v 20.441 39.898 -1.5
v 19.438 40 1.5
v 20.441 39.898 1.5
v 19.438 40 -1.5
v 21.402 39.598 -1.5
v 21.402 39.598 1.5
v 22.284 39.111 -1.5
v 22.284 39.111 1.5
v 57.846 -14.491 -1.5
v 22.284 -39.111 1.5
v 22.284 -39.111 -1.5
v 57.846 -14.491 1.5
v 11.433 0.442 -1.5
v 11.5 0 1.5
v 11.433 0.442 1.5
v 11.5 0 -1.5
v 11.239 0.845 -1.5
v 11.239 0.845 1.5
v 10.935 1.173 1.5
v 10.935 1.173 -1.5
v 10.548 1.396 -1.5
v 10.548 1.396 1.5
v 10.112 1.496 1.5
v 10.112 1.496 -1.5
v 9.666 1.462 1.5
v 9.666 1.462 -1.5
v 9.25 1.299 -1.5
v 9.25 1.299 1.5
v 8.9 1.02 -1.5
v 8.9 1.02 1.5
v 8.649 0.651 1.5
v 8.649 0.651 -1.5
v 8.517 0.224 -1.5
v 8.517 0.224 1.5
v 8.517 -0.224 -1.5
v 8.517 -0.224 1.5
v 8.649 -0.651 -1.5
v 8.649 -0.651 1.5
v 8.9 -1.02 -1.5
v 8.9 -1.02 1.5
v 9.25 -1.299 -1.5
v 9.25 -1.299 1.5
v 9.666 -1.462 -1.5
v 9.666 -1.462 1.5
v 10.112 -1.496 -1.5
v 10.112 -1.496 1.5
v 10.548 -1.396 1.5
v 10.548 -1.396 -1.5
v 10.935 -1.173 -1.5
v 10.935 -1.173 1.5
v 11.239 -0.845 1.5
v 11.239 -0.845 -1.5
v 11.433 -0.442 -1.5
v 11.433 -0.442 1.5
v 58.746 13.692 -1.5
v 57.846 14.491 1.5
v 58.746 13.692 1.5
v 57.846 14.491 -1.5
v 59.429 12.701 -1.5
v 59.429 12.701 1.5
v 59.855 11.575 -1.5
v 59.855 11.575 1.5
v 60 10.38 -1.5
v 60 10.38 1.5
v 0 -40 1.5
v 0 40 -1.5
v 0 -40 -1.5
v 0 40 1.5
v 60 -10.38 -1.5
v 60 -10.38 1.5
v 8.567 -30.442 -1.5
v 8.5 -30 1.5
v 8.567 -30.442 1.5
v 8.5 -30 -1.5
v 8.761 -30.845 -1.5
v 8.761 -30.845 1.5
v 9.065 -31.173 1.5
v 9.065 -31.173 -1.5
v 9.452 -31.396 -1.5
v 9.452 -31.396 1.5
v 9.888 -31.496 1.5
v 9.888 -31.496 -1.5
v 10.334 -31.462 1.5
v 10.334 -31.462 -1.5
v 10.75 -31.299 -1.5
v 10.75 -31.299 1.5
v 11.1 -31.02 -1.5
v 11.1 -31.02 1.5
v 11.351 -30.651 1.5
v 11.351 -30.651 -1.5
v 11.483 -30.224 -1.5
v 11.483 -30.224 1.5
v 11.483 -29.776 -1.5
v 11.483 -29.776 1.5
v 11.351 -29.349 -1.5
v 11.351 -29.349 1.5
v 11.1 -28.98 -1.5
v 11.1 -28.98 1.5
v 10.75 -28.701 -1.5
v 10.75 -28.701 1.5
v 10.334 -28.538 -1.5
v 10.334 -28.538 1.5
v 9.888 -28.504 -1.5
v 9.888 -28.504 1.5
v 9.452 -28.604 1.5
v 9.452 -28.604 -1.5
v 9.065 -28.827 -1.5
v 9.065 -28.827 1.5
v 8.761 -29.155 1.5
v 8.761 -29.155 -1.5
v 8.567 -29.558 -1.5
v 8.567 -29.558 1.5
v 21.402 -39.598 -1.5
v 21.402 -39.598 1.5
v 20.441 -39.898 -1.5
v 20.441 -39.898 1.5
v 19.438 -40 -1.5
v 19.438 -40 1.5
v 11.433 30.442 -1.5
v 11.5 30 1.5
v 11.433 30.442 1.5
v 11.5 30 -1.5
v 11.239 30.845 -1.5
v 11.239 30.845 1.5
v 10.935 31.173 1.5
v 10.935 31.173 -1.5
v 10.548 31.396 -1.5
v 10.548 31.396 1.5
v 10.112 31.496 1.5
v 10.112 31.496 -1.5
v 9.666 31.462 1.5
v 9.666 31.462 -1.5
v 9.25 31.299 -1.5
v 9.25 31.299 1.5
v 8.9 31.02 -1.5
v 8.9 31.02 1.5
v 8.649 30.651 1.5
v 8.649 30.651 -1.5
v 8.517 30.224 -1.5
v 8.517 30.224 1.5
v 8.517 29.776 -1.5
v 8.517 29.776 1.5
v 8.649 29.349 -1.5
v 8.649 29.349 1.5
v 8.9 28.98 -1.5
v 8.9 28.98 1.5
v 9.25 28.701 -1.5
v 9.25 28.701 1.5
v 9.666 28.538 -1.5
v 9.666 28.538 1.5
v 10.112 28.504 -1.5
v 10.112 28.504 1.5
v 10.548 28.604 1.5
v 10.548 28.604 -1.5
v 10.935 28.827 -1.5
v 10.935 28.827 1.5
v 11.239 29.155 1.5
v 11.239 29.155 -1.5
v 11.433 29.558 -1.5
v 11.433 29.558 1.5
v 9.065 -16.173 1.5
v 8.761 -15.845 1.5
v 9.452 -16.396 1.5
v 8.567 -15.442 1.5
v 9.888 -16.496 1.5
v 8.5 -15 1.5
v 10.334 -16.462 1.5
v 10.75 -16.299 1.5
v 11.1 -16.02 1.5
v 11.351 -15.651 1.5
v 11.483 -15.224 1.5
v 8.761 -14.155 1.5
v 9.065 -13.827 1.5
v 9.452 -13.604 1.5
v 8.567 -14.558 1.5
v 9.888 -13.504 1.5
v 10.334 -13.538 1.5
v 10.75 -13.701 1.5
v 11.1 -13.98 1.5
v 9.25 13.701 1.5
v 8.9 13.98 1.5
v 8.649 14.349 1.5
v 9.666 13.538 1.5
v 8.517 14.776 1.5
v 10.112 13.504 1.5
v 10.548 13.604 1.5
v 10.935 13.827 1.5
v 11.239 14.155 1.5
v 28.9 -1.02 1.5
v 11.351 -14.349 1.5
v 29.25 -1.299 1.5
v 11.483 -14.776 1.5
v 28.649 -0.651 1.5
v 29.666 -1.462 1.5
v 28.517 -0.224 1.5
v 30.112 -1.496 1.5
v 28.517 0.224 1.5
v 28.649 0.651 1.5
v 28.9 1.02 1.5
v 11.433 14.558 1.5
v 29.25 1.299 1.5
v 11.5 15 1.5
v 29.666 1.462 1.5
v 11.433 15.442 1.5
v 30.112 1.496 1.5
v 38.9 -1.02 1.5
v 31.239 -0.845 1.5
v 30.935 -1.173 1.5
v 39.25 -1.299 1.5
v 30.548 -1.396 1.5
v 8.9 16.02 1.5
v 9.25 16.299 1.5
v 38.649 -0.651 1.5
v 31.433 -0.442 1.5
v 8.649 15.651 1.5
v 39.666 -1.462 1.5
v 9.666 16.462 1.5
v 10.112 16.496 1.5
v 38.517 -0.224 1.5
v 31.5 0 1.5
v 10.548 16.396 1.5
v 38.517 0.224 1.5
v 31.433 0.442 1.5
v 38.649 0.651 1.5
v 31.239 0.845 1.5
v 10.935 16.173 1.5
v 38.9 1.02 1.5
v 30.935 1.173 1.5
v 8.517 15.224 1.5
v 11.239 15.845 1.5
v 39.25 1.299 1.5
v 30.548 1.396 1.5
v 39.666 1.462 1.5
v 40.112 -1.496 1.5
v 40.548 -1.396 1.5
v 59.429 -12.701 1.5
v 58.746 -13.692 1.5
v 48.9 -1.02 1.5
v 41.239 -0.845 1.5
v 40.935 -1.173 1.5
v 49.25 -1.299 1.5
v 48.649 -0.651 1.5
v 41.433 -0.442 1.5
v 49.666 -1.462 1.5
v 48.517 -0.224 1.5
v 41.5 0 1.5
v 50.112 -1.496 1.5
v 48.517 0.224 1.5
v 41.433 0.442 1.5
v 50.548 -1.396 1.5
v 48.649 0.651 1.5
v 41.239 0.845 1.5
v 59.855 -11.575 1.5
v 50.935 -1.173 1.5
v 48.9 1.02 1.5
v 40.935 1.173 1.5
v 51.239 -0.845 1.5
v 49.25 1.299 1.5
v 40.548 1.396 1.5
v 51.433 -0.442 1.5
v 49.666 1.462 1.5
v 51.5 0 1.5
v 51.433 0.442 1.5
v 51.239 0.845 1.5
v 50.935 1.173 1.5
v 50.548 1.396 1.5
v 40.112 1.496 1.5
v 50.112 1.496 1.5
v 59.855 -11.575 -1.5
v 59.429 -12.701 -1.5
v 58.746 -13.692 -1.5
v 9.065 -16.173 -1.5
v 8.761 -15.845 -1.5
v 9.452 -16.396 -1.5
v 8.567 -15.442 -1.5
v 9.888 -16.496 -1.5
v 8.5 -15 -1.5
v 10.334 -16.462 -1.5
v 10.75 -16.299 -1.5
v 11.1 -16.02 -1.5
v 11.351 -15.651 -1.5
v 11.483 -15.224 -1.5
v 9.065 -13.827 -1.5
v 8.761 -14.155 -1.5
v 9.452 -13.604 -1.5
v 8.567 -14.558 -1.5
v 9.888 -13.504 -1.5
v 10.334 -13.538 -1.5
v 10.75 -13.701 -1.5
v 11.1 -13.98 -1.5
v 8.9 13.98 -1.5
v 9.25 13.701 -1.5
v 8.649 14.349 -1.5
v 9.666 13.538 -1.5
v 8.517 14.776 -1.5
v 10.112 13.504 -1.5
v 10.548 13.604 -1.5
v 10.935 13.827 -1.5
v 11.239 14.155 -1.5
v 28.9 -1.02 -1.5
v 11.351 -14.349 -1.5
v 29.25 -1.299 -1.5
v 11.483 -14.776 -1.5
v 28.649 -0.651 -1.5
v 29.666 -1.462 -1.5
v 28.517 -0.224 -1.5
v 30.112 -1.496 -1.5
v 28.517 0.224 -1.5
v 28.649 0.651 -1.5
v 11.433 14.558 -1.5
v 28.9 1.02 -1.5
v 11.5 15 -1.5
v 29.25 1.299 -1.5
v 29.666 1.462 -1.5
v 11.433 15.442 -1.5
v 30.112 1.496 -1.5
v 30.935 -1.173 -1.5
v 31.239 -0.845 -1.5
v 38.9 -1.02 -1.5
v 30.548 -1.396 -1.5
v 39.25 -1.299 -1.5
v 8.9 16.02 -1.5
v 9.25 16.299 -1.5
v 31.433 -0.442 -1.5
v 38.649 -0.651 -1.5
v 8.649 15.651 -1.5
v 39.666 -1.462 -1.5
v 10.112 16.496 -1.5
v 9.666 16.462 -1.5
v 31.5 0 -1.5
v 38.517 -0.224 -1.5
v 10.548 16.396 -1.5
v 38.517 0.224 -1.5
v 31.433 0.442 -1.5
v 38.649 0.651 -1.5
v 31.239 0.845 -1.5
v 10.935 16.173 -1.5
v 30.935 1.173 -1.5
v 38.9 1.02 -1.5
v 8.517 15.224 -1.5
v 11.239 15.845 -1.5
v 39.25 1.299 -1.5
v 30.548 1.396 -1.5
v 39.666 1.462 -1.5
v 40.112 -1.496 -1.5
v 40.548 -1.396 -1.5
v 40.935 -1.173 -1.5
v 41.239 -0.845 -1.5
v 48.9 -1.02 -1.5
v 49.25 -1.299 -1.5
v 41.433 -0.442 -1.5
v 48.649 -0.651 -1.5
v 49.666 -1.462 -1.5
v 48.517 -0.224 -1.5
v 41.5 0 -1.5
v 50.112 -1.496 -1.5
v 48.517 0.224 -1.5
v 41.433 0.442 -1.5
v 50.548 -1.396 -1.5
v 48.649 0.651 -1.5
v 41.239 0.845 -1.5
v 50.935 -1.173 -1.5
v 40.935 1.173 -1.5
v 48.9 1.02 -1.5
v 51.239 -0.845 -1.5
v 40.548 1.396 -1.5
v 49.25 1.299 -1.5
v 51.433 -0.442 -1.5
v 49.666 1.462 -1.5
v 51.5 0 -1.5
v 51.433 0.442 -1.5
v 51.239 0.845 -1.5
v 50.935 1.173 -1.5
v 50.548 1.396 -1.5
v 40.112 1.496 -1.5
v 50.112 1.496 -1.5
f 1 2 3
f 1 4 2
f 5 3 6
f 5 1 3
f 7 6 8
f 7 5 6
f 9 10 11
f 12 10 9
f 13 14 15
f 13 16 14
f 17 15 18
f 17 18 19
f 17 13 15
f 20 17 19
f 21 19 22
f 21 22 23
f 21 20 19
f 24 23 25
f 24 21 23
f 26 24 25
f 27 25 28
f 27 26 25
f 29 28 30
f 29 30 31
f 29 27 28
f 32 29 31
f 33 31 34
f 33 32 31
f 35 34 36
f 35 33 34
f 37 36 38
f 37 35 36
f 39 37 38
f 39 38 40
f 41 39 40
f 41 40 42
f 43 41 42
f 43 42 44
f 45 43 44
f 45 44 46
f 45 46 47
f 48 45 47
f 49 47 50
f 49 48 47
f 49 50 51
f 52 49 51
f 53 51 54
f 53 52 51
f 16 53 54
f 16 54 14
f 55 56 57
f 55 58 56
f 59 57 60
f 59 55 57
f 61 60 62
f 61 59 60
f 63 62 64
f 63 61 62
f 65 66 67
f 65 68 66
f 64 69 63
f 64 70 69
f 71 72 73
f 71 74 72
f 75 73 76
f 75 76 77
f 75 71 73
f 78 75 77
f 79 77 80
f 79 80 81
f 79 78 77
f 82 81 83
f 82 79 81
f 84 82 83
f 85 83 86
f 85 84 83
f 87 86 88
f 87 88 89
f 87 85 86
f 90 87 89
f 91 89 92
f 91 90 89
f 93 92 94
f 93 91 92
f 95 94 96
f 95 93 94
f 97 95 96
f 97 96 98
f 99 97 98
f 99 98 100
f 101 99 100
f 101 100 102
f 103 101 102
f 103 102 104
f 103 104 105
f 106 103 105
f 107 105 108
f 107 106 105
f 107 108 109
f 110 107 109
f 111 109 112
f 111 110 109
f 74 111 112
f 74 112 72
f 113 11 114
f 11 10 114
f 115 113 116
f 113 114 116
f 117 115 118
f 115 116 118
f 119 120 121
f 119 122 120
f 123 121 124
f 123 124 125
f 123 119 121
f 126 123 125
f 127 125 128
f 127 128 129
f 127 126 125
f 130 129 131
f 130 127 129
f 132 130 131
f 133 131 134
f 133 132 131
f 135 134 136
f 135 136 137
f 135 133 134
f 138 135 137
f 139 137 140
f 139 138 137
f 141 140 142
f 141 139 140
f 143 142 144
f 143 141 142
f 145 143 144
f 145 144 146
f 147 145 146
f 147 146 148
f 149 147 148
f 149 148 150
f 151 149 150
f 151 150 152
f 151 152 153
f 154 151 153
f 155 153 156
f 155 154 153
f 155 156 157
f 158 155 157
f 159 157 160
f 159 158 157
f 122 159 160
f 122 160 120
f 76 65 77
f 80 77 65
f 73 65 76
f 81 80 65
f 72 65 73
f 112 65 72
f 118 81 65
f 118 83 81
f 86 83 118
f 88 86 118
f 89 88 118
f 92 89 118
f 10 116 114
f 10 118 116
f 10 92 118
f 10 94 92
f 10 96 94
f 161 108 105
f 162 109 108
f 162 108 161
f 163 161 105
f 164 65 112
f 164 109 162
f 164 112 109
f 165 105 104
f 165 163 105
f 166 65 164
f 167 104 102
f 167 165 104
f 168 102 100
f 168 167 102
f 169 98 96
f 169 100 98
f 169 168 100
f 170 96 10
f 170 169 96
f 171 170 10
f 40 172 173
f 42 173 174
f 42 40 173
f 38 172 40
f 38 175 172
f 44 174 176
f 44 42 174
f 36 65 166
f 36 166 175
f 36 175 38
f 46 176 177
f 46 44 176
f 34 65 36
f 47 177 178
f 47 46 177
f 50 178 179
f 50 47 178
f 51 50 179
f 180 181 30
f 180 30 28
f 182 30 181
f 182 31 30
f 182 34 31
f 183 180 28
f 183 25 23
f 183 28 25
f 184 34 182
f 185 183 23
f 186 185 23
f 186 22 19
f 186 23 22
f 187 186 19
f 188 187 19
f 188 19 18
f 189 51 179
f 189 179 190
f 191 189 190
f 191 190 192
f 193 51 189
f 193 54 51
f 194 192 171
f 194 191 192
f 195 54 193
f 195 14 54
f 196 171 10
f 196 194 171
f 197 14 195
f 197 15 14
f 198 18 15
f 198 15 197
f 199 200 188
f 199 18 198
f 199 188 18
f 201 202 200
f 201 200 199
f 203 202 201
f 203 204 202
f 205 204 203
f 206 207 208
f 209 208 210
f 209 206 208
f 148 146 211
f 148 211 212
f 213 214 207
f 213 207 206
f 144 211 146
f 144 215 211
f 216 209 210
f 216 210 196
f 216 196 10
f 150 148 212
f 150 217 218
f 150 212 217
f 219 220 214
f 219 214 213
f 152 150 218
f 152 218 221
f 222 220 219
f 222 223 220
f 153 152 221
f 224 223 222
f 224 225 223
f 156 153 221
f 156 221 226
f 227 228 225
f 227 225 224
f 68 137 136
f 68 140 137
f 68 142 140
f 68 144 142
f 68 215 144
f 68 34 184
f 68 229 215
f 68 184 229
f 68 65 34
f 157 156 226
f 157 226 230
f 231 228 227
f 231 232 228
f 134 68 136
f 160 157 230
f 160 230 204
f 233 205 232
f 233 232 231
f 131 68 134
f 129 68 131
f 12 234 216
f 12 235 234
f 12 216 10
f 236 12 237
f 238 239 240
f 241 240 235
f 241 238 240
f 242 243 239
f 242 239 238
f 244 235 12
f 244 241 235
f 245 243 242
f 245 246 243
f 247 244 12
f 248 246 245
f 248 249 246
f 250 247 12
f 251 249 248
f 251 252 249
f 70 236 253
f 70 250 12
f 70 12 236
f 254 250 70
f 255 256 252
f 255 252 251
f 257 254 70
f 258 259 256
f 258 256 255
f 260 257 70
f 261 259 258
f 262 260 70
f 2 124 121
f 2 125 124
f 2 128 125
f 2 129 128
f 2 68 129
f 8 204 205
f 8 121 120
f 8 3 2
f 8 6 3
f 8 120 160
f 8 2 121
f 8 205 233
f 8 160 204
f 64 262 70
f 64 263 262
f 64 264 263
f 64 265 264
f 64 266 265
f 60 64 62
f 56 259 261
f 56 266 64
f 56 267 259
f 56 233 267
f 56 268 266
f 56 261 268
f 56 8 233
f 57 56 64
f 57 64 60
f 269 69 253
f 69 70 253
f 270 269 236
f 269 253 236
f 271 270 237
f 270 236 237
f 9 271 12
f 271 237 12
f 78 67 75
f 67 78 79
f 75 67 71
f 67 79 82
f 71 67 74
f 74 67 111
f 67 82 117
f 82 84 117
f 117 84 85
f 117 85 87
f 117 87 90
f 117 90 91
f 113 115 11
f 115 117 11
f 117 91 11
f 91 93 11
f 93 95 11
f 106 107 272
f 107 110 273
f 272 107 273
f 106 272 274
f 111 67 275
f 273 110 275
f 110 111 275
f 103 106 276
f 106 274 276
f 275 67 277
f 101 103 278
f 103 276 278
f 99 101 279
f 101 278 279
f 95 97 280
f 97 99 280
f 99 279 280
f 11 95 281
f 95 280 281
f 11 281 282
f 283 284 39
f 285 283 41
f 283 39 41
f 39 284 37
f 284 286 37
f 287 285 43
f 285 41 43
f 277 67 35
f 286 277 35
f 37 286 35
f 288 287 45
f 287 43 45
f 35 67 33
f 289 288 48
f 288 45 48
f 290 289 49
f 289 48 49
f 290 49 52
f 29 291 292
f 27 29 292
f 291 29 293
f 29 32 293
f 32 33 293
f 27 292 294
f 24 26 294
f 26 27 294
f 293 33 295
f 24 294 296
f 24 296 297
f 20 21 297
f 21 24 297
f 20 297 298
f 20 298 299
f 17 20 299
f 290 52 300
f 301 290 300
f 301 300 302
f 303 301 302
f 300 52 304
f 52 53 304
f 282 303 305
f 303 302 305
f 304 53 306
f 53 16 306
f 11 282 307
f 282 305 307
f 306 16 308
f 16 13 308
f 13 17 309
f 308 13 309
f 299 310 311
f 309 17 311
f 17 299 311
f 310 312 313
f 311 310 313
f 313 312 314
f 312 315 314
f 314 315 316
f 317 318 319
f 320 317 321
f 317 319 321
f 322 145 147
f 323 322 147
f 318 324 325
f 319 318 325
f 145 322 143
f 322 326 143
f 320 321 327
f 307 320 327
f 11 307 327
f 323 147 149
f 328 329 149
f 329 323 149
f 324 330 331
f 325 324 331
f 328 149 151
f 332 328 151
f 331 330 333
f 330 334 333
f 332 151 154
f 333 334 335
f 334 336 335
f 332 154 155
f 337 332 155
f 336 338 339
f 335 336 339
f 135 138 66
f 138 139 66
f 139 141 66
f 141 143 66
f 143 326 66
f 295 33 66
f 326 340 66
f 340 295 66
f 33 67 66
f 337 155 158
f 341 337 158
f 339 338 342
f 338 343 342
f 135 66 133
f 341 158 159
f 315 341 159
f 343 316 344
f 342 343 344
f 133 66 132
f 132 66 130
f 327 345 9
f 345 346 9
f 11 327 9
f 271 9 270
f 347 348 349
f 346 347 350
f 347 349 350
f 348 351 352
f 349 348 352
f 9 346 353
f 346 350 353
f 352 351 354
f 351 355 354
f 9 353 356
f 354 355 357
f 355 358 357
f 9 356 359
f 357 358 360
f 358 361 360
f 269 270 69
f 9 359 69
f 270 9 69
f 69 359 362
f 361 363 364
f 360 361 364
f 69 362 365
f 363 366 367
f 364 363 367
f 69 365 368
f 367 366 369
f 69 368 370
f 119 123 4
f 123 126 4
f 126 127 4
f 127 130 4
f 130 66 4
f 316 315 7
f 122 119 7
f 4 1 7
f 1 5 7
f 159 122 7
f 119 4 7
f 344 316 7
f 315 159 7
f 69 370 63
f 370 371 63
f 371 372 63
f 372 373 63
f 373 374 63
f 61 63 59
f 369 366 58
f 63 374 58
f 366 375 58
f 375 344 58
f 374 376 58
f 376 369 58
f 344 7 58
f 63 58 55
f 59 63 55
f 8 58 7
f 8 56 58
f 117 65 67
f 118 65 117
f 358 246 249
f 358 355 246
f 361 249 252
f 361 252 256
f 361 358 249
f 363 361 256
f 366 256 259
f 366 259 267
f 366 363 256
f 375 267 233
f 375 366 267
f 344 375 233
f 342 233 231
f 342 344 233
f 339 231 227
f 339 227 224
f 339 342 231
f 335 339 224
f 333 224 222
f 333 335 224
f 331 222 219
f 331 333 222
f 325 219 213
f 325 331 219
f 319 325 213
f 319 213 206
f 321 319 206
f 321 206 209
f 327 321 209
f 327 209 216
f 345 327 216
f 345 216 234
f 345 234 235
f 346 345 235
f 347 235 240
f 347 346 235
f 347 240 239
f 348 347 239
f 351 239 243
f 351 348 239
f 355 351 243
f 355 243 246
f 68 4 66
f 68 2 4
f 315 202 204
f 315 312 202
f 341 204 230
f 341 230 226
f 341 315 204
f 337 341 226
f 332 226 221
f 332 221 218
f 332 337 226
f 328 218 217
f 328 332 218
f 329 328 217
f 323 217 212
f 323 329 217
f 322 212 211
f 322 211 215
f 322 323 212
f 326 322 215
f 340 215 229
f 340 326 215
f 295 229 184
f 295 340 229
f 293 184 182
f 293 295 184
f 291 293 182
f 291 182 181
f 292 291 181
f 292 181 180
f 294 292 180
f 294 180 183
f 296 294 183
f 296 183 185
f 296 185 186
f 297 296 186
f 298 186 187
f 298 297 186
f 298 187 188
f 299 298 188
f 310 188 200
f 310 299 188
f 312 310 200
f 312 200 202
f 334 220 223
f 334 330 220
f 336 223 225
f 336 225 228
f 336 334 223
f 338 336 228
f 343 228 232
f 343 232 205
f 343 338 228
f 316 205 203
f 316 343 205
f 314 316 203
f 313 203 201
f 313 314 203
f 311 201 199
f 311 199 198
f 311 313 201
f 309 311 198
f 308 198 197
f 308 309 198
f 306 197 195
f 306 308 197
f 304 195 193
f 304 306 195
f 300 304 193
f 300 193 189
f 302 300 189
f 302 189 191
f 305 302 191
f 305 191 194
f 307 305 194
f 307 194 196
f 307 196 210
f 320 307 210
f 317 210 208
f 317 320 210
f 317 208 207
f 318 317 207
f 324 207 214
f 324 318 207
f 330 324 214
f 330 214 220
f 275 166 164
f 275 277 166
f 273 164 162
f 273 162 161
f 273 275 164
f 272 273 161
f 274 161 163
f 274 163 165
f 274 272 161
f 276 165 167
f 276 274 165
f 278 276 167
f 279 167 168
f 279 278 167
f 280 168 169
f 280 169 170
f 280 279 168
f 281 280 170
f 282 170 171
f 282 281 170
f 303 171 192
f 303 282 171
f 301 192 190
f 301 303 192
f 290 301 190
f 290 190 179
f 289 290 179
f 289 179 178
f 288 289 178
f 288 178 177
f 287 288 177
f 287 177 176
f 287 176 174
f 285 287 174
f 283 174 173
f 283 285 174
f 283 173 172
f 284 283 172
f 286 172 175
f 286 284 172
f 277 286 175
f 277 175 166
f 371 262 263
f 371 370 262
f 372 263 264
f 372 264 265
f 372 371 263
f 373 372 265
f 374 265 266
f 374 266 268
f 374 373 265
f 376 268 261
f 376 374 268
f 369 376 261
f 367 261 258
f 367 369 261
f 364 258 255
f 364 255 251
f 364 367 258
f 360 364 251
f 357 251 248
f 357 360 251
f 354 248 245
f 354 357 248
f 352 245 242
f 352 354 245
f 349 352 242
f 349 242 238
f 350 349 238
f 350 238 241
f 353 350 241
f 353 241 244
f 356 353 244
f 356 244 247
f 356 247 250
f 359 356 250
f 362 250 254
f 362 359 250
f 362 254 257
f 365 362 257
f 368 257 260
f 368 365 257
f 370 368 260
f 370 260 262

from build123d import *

# Parameters (mm, degrees)
SKETCH_1_R      = 1.5
EXTRUDE_1_DEPTH = 1.5
FILLET_1_R      = 5


with BuildPart() as part:
    # 草图1 → 凸台-拉伸1 (new, symmetric)
    with BuildSketch(Plane.XY):
        Polygon((0, 40), (0, -40), (21, -40), (60, -13), (60, 13), (21, 40), align=None)
        with Locations((10, 0)):
            Circle(SKETCH_1_R, mode=Mode.SUBTRACT)
        with Locations((10, 15)):
            Circle(SKETCH_1_R, mode=Mode.SUBTRACT)
        with Locations((10, 30)):
            Circle(SKETCH_1_R, mode=Mode.SUBTRACT)
        with Locations(Location((10, -15, 0), (0, 0, 180))):
            Circle(SKETCH_1_R, mode=Mode.SUBTRACT)
        with Locations(Location((10, -30, 0), (0, 0, 180))):
            Circle(SKETCH_1_R, mode=Mode.SUBTRACT)
        with Locations((30, 0)):
            Circle(SKETCH_1_R, mode=Mode.SUBTRACT)
        with Locations((40, 0)):
            Circle(SKETCH_1_R, mode=Mode.SUBTRACT)
        with Locations((50, 0)):
            Circle(SKETCH_1_R, mode=Mode.SUBTRACT)
    extrude(amount=EXTRUDE_1_DEPTH, both=True)

    # 圆角1
    fillet_1_edges = [part.edges().sort_by_distance(p)[0] for p in [
        (60, 13, 0),
        (60, -13, 0),
        (21, -40, 0),
        (21, 40, 0),
    ]]
    fillet(fillet_1_edges, radius=FILLET_1_R)


solid = part.part
